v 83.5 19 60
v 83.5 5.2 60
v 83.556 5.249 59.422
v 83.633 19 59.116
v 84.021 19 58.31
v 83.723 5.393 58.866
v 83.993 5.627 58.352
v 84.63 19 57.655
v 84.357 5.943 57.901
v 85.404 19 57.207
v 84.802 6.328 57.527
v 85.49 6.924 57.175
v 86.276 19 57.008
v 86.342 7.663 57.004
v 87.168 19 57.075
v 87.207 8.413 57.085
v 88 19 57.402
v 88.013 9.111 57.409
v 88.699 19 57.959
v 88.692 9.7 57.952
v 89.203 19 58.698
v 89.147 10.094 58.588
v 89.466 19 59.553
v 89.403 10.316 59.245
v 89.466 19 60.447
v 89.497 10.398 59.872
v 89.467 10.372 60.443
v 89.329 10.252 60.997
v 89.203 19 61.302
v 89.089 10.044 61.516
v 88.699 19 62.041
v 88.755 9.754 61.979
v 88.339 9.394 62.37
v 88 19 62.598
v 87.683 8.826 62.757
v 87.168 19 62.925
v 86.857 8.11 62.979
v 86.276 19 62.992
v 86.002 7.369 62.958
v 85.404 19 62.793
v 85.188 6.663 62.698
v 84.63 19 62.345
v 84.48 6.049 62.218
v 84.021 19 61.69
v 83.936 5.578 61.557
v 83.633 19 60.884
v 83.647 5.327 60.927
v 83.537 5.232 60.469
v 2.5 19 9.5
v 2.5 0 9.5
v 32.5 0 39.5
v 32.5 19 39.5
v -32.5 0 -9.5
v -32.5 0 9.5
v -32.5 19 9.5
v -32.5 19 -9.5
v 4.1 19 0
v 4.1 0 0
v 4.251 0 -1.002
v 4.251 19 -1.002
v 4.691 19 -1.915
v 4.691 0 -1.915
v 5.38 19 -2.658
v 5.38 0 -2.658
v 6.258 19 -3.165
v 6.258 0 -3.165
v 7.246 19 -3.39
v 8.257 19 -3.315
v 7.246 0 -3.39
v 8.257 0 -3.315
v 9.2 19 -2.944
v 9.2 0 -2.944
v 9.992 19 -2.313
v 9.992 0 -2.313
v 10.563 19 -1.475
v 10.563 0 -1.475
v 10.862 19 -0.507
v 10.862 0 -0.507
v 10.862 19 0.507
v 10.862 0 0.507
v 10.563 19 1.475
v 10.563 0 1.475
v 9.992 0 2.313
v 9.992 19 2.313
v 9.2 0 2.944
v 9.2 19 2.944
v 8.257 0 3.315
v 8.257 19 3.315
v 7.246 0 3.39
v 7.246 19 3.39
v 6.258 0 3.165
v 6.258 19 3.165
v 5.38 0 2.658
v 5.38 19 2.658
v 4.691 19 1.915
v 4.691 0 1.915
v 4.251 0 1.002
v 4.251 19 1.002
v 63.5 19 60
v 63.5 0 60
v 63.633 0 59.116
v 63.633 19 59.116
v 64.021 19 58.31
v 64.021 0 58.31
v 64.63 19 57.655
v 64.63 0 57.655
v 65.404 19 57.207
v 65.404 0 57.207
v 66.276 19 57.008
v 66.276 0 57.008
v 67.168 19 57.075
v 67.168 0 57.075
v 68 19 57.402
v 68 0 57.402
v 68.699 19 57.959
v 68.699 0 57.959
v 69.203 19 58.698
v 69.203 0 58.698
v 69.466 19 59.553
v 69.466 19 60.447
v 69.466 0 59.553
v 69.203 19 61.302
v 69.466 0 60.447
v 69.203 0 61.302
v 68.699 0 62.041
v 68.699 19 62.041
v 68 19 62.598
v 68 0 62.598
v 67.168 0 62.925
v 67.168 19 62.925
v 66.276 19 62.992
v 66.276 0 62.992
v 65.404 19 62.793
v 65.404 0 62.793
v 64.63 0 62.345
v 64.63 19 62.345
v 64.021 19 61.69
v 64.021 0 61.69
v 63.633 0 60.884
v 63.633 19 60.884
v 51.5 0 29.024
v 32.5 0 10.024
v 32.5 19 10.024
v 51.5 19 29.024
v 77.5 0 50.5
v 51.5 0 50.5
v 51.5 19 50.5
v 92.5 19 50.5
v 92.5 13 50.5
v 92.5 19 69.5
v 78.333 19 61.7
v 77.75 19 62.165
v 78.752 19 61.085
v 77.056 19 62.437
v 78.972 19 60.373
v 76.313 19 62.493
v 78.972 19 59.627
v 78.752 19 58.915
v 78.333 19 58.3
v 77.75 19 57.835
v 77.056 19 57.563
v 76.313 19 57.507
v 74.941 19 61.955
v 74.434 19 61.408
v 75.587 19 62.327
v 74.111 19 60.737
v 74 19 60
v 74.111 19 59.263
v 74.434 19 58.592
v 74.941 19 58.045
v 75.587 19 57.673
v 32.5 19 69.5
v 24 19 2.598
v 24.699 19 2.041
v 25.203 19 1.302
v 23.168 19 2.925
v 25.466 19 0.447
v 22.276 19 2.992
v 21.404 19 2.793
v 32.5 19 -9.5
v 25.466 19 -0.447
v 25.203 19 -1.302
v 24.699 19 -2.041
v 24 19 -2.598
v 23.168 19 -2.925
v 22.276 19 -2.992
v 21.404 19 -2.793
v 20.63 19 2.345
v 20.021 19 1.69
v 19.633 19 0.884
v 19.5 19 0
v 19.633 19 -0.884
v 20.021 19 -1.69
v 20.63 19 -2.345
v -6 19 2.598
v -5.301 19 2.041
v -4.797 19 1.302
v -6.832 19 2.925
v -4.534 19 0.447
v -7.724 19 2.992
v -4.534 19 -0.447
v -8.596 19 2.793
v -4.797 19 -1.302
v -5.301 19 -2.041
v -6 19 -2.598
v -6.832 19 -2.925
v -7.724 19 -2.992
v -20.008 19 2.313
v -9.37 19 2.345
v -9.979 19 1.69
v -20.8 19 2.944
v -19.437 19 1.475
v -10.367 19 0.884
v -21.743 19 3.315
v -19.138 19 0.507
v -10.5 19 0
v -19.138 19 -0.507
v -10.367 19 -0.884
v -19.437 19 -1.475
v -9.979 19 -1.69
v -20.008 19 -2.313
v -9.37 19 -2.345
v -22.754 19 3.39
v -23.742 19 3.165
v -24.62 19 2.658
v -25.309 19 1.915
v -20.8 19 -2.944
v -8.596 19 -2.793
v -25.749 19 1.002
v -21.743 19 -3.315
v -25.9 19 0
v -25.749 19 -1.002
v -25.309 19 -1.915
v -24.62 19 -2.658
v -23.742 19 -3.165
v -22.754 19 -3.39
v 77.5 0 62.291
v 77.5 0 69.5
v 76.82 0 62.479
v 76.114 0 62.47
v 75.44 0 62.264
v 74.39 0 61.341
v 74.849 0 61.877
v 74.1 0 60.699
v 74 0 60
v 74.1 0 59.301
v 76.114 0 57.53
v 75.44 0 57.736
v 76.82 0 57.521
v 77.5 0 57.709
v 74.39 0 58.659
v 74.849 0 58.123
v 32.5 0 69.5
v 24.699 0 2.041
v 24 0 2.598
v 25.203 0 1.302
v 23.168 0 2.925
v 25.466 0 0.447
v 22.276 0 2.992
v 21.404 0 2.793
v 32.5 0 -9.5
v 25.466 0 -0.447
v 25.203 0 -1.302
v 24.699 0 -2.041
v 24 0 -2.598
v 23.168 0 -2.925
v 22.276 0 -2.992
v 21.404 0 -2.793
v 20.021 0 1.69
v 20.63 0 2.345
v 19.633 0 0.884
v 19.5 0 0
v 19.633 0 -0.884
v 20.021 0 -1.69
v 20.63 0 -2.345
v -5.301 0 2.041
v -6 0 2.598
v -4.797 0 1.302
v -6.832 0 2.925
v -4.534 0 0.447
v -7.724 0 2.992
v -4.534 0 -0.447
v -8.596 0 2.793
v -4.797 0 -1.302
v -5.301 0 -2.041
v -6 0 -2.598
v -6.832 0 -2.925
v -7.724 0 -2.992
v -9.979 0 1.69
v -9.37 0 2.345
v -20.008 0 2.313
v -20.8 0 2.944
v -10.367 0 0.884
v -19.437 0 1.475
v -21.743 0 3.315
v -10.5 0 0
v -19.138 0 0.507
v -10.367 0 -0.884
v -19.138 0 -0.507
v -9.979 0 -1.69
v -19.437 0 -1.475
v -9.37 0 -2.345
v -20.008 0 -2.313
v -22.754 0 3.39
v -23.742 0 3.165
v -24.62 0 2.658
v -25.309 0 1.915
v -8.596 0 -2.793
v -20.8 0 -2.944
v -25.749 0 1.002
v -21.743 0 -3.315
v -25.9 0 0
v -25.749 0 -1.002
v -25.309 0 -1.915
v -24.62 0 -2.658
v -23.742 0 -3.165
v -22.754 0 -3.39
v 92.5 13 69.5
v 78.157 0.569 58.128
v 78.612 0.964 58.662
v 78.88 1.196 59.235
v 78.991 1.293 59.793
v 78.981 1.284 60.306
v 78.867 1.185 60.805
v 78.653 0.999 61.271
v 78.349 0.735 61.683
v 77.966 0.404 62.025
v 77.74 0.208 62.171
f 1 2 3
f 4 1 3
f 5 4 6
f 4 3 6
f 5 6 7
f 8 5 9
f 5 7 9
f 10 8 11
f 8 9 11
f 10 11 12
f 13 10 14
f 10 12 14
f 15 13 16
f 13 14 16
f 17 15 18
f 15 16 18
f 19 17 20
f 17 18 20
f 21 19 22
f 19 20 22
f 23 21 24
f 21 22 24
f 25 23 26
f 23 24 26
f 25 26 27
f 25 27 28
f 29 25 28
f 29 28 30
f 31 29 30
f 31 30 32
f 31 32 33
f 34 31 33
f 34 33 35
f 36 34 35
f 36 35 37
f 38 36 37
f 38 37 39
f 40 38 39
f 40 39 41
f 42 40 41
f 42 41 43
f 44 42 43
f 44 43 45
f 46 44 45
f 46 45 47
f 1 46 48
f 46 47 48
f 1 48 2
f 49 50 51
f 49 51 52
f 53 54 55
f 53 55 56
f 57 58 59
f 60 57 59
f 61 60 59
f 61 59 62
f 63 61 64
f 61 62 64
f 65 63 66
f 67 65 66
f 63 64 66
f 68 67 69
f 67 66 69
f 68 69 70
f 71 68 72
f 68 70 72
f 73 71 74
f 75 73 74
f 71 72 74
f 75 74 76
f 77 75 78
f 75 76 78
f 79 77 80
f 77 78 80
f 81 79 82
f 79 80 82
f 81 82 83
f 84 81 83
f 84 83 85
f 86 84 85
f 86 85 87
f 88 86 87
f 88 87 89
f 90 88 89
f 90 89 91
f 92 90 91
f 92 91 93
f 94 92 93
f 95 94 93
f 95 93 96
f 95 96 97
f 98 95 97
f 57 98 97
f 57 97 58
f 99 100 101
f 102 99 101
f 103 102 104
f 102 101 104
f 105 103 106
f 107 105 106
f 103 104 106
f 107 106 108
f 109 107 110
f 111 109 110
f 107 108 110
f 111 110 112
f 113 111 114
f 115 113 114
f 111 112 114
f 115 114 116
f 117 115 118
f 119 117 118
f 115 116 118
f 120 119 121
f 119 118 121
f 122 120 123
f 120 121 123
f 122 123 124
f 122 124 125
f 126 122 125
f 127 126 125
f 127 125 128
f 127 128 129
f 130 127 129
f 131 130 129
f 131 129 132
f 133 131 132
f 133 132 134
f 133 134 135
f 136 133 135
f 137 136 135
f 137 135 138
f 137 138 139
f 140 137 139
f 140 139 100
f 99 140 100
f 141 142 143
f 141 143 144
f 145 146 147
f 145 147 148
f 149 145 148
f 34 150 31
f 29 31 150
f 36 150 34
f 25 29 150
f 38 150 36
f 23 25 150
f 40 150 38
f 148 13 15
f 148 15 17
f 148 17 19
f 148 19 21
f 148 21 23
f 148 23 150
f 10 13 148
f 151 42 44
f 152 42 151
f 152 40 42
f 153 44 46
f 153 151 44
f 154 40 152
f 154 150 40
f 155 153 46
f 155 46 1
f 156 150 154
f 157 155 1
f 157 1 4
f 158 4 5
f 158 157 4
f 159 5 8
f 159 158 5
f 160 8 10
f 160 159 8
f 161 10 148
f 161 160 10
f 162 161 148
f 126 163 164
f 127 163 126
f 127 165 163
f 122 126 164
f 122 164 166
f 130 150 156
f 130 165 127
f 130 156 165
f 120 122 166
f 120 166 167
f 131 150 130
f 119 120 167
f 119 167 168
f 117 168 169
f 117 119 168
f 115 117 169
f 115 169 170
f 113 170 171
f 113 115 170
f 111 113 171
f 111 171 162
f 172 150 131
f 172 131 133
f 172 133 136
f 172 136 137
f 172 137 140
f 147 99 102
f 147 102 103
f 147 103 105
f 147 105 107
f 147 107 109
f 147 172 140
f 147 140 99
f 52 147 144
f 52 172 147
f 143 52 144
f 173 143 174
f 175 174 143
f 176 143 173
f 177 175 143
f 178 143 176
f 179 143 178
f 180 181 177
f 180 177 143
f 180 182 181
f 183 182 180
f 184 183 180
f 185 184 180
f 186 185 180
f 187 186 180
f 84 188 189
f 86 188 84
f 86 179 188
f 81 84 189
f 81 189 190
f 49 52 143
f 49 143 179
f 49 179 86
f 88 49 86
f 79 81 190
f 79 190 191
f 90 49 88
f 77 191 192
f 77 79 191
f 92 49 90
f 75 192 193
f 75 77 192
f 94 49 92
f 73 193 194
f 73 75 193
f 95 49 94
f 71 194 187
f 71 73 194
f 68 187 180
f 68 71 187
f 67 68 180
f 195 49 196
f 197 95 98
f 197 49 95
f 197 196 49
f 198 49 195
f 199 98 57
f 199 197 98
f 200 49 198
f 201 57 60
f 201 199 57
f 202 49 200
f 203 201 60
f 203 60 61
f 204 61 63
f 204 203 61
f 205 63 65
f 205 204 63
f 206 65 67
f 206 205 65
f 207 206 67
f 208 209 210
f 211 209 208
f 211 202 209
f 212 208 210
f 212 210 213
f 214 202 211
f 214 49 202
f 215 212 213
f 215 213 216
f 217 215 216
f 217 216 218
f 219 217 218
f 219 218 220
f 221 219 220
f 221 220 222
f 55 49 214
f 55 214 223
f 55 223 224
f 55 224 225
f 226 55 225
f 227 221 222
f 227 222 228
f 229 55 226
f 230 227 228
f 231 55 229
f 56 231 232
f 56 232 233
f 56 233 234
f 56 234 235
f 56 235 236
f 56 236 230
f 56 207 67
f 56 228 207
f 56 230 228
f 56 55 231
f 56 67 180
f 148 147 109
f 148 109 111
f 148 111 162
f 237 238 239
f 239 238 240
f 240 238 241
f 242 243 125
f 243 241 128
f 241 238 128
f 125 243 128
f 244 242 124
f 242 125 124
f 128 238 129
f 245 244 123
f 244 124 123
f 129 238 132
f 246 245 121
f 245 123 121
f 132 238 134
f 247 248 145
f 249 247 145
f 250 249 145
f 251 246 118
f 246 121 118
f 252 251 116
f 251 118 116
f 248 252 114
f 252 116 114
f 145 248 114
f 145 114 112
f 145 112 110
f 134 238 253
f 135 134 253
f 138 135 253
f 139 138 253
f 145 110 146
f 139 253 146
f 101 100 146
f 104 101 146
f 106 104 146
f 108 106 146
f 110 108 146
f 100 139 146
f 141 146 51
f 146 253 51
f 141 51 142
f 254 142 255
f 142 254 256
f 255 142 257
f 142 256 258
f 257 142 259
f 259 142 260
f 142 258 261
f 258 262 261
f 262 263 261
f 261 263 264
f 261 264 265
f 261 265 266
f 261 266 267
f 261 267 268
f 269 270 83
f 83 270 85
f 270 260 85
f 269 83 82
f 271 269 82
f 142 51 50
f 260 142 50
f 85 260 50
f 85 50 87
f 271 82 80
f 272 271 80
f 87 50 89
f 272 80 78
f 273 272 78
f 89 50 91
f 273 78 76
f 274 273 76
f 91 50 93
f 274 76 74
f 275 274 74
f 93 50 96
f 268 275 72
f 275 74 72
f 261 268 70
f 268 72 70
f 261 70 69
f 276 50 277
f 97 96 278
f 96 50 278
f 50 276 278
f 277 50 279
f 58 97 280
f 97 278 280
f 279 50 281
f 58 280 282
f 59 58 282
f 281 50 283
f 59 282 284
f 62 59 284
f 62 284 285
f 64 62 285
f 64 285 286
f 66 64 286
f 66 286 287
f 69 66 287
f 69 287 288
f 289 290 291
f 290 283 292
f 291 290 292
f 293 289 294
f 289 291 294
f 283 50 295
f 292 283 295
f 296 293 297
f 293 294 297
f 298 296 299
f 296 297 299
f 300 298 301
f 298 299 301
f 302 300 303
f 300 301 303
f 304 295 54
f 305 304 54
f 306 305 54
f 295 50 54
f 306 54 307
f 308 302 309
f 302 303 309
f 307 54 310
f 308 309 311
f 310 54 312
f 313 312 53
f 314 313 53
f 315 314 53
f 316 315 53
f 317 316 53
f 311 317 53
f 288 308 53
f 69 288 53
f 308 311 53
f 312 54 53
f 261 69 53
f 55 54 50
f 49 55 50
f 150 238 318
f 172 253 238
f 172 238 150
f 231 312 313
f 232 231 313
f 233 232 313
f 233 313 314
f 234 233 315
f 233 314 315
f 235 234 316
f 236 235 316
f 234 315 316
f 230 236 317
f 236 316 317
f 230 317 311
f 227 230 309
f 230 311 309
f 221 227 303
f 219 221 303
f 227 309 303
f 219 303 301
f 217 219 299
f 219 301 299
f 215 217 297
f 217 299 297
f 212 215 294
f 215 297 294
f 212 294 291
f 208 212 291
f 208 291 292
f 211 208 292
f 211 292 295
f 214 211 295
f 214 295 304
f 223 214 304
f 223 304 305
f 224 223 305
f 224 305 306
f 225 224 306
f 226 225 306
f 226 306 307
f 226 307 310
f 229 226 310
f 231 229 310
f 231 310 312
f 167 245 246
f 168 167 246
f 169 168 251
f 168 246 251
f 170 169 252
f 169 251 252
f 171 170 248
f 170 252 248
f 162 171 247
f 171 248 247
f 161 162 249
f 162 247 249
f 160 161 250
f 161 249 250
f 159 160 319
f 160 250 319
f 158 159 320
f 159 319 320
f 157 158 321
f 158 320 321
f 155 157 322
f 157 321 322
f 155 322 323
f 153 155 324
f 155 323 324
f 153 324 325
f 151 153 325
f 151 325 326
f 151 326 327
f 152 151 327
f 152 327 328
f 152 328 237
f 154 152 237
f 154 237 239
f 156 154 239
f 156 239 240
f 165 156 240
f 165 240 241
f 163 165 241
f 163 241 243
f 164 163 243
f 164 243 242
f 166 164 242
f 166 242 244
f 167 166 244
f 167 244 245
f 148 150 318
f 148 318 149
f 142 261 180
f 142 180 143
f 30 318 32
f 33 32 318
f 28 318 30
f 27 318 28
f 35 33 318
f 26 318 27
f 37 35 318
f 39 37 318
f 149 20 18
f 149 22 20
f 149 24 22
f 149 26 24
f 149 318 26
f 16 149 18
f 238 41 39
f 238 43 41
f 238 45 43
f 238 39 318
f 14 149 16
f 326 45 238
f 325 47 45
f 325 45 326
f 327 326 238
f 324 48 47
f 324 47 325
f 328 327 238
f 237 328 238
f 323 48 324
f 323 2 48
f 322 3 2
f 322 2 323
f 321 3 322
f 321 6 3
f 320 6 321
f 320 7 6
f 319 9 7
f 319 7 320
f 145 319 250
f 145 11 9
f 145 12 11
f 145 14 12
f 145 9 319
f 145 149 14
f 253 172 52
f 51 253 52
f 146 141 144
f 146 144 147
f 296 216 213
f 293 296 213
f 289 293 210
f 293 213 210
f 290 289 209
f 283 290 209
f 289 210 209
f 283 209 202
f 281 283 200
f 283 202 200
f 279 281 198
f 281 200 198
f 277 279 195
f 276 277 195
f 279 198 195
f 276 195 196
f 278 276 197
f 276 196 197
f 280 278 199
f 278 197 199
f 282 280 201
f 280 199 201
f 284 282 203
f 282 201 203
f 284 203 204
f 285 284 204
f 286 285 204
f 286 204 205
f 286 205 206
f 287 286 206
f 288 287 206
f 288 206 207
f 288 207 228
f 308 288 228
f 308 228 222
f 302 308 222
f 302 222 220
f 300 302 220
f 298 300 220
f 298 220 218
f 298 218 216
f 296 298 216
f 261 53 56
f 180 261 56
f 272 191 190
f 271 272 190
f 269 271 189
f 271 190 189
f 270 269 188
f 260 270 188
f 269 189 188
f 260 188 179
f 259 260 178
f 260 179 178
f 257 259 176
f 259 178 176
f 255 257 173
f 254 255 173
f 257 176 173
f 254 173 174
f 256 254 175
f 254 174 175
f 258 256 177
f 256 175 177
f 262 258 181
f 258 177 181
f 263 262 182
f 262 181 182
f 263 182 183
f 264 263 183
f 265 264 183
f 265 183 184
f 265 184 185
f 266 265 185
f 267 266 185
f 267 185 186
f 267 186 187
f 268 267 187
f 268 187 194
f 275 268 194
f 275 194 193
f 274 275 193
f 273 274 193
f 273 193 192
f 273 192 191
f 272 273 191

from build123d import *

# Parameters (mm, degrees)
SKETCH_1_W               = 65
SKETCH_1_H               = 19
EXTRUDE_1_DEPTH          = 19
HOLE_WIZARD_M8_2_D       = 6.8
MM_2_D                   = 6
MM_2_DEPTH               = 20
MM_2_TIP                 = 1.802581857
SKETCH_6_W               = 79
SKETCH_6_H               = 19
EXTRUDE_2_DEPTH          = 60
MM_3_D                   = 6
HOLE_WIZARD_M6_1_D       = 5
CHAMFER_2_SIZE           = 30
CUT_EXTRUDE_1_DEPTH      = 118.249733475
CUT_EXTRUDE_2_DEPTH      = 124.118845024
CUT_EXTRUDE_2_DEPTH_BACK = 124.118845024


with BuildPart() as part:
    # 草图1 → 凸台-拉伸1 (new body)
    with BuildSketch(Plane(origin=(0, 0, 0), x_dir=(1, 0, 0), z_dir=(0, 1, 0))):
        Rectangle(SKETCH_1_W, SKETCH_1_H)
    extrude(amount=EXTRUDE_1_DEPTH)

    # M8 螺纹孔2 (through all)
    with Locations(Plane(origin=(0, 19, 0), x_dir=(1, 0, 0), z_dir=(0, 1, 0))):
        with Locations((-22.5, 0), (7.5, 0)):
            Hole(HOLE_WIZARD_M8_2_D / 2)

    # 大小mm 暗销孔2
    with Locations(Plane.XZ):
        with Locations((-7.5, 0), (22.5, 0)):
            Hole(MM_2_D / 2, depth=MM_2_DEPTH)
            with Locations((0, 0, -(MM_2_DEPTH + MM_2_TIP / 2))):  # 118° drill point
                Cone(0, MM_2_D / 2, MM_2_TIP, mode=Mode.SUBTRACT)

    # 草图6 → 凸台-拉伸2 (add)
    with BuildSketch(Plane(origin=(32.5, 0, 0), x_dir=(0, 0, -1), z_dir=(1, 0, 0))):
        with Locations((-30, 9.5)):
            Rectangle(SKETCH_6_W, SKETCH_6_H)
    extrude(amount=EXTRUDE_2_DEPTH)

    # 大小mm 暗销孔3 (through all)
    with Locations(Plane(origin=(0, 19, 0), x_dir=(1, 0, 0), z_dir=(0, 1, 0))):
        with Locations((86.5, -60), (66.5, -60)):
            Hole(MM_3_D / 2)

    # M6 螺纹孔1 (through all)
    with Locations(Plane(origin=(0, 19, 0), x_dir=(1, 0, 0), z_dir=(0, 1, 0))):
        with Locations((76.5, -60)):
            Hole(HOLE_WIZARD_M6_1_D / 2)

    # 倒角2
    chamfer_2_edges = [part.edges().sort_by_distance(p)[0] for p in [
        (32.5, 9.5, 9.5),
    ]]
    chamfer(chamfer_2_edges, length=CHAMFER_2_SIZE)

    # 草图11 → 切除-拉伸1 (cut, through all)
    with BuildSketch(Plane(origin=(0, 0, 0), x_dir=(-1, 0, 0), z_dir=(0, -1, 0))):
        Polygon((-51.5, -50.5), (-95.074786325, -50.5), (-95.074786325, 28.691704374), (-32.5, 28.691704374), (-32.5, -10.02428356), (-51.5, -29.02428356), align=None)
    extrude(amount=-CUT_EXTRUDE_1_DEPTH, mode=Mode.SUBTRACT)

    # 草图12 → 切除-拉伸2 (cut, two sides: drawn at the far end of the back side and taken through both)
    with BuildSketch(Plane.XY.offset(69.5).offset(-CUT_EXTRUDE_2_DEPTH_BACK)):
        Polygon((289.998105351, 184.165024638), (92.5, 13), (77.5, 0), (-119.998105351, -171.165024638), (222.331943924, -566.16123534), (632.328154627, -210.831186065), align=None)
    extrude(amount=CUT_EXTRUDE_2_DEPTH + CUT_EXTRUDE_2_DEPTH_BACK, mode=Mode.SUBTRACT)


solid = part.part
